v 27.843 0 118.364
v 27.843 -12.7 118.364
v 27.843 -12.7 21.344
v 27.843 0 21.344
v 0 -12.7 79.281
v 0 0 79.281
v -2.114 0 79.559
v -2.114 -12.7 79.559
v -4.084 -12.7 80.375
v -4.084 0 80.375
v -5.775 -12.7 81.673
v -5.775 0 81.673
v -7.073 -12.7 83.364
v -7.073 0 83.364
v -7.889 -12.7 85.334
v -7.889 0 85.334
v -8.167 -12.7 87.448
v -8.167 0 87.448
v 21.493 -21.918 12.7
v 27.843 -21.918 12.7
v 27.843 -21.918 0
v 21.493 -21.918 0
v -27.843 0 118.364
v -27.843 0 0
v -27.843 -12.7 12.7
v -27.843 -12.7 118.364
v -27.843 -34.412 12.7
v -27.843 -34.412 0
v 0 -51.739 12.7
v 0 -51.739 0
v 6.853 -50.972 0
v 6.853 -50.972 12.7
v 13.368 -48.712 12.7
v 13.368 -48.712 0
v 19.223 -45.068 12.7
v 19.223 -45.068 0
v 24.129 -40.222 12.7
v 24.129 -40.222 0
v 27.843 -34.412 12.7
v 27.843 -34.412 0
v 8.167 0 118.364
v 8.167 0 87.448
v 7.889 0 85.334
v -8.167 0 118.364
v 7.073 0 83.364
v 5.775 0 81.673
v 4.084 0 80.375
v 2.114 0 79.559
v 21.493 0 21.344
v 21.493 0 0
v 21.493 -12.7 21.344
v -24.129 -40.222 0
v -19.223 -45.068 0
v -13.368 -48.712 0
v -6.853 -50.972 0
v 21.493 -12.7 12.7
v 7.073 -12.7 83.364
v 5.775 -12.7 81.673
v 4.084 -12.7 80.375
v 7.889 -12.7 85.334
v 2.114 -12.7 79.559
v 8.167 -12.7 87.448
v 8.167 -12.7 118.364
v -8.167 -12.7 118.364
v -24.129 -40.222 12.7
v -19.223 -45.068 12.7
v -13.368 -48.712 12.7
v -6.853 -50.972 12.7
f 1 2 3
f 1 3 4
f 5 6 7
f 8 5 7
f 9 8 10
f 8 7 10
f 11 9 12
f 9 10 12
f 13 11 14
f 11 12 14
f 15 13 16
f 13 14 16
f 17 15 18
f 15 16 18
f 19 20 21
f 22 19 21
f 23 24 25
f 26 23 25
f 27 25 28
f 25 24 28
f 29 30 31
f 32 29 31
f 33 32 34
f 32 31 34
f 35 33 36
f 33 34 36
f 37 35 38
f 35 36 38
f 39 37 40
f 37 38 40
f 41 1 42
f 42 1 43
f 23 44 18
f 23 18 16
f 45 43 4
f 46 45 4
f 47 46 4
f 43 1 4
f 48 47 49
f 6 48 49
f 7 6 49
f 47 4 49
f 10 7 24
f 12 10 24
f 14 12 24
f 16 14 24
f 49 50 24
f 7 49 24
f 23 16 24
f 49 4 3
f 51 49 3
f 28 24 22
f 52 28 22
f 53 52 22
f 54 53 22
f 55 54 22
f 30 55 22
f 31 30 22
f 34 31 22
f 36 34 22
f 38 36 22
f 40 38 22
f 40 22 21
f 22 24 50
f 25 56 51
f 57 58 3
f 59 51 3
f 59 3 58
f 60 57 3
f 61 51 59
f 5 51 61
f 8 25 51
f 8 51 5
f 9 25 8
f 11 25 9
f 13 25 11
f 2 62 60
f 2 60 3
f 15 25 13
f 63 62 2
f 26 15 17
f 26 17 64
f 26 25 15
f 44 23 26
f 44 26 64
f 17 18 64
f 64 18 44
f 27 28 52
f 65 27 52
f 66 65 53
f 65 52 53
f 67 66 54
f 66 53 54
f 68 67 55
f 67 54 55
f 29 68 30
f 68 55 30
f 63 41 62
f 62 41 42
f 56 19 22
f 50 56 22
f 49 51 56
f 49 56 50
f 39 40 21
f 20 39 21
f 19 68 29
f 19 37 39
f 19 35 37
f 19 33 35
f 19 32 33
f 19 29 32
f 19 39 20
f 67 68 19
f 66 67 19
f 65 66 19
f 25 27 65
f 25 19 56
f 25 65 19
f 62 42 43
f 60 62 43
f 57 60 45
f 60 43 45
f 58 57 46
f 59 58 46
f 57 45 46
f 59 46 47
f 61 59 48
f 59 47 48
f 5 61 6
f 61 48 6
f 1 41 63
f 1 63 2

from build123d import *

# Parameters (mm, degrees)
F1_DEPTH      = 118.364
F2_W          = 68.2598565102
F2_H          = 105.664
F3_DEPTH      = 27.844343094
F3_DEPTH_BACK = 27.844343094
F4_W          = 9.2177082181
F4_H          = 8.6436167687
F5_DEPTH      = 6.35
F7_DEPTH      = 51.7396268929


with BuildPart() as f1:
    # F0 (on Top) → F1 (new body)
    with BuildSketch(Plane.XY):
        with BuildLine():
            Line((27.843343094, 0), (0, 0))
            Line((0, 0), (-27.843343094, 0))
            Line((-27.843343094, 0), (-27.843343094, -34.4115048647))
            ThreePointArc((-27.843343094, -34.4115048647), (-16.3972628236, -47.053149323), (0, -51.7386268929))
            ThreePointArc((0, -51.7386268929), (16.3972628236, -47.053149323), (27.843343094, -34.4115048647))
            Line((27.843343094, -34.4115048647), (27.843343094, 0))
        make_face()
    extrude(amount=F1_DEPTH)

    # F2 (on Right) → F3 (cut, two sides)
    with BuildSketch(Plane.YZ) as f3_sk:
        with Locations((-46.8299282551, 65.532)):
            Rectangle(F2_W, F2_H)
    extrude(amount=-F3_DEPTH, mode=Mode.SUBTRACT)
    extrude(f3_sk.sketch, amount=F3_DEPTH_BACK, mode=Mode.SUBTRACT)

    # F4 (on face) → F5 (cut)
    with BuildSketch(Plane.YZ.offset(27.843343094)):
        with Locations((-17.308854109, 17.0218083844)):
            Rectangle(F4_W, F4_H)
        Polygon((-21.9177082181, 0), (0, 0), (0, 21.3436167687), (-12.7, 21.3436167687), (-12.7, 12.7), (-21.9177082181, 12.7), align=None)
    extrude(amount=-F5_DEPTH, mode=Mode.SUBTRACT)

    # F6 (on face) → F7 (cut, through all)
    with BuildSketch(Plane(origin=(0, 0, 0), x_dir=(-1, 0, 0), z_dir=(0, 1, 0))):
        with BuildLine():
            Line((8.167100139, 118.364), (0, 118.364))
            Line((0, 118.364), (-8.167100139, 118.364))
            Line((-8.167100139, 118.364), (-8.167100139, 87.4478146434))
            ThreePointArc((-8.167100139, 87.4478146434), (-5.7750118909, 81.6728027525), (0, 79.2807145044))
            ThreePointArc((0, 79.2807145044), (5.7750118909, 81.6728027525), (8.167100139, 87.4478146434))
            Line((8.167100139, 87.4478146434), (8.167100139, 118.364))
        make_face()
    extrude(amount=-F7_DEPTH, mode=Mode.SUBTRACT)


solid = f1.part
